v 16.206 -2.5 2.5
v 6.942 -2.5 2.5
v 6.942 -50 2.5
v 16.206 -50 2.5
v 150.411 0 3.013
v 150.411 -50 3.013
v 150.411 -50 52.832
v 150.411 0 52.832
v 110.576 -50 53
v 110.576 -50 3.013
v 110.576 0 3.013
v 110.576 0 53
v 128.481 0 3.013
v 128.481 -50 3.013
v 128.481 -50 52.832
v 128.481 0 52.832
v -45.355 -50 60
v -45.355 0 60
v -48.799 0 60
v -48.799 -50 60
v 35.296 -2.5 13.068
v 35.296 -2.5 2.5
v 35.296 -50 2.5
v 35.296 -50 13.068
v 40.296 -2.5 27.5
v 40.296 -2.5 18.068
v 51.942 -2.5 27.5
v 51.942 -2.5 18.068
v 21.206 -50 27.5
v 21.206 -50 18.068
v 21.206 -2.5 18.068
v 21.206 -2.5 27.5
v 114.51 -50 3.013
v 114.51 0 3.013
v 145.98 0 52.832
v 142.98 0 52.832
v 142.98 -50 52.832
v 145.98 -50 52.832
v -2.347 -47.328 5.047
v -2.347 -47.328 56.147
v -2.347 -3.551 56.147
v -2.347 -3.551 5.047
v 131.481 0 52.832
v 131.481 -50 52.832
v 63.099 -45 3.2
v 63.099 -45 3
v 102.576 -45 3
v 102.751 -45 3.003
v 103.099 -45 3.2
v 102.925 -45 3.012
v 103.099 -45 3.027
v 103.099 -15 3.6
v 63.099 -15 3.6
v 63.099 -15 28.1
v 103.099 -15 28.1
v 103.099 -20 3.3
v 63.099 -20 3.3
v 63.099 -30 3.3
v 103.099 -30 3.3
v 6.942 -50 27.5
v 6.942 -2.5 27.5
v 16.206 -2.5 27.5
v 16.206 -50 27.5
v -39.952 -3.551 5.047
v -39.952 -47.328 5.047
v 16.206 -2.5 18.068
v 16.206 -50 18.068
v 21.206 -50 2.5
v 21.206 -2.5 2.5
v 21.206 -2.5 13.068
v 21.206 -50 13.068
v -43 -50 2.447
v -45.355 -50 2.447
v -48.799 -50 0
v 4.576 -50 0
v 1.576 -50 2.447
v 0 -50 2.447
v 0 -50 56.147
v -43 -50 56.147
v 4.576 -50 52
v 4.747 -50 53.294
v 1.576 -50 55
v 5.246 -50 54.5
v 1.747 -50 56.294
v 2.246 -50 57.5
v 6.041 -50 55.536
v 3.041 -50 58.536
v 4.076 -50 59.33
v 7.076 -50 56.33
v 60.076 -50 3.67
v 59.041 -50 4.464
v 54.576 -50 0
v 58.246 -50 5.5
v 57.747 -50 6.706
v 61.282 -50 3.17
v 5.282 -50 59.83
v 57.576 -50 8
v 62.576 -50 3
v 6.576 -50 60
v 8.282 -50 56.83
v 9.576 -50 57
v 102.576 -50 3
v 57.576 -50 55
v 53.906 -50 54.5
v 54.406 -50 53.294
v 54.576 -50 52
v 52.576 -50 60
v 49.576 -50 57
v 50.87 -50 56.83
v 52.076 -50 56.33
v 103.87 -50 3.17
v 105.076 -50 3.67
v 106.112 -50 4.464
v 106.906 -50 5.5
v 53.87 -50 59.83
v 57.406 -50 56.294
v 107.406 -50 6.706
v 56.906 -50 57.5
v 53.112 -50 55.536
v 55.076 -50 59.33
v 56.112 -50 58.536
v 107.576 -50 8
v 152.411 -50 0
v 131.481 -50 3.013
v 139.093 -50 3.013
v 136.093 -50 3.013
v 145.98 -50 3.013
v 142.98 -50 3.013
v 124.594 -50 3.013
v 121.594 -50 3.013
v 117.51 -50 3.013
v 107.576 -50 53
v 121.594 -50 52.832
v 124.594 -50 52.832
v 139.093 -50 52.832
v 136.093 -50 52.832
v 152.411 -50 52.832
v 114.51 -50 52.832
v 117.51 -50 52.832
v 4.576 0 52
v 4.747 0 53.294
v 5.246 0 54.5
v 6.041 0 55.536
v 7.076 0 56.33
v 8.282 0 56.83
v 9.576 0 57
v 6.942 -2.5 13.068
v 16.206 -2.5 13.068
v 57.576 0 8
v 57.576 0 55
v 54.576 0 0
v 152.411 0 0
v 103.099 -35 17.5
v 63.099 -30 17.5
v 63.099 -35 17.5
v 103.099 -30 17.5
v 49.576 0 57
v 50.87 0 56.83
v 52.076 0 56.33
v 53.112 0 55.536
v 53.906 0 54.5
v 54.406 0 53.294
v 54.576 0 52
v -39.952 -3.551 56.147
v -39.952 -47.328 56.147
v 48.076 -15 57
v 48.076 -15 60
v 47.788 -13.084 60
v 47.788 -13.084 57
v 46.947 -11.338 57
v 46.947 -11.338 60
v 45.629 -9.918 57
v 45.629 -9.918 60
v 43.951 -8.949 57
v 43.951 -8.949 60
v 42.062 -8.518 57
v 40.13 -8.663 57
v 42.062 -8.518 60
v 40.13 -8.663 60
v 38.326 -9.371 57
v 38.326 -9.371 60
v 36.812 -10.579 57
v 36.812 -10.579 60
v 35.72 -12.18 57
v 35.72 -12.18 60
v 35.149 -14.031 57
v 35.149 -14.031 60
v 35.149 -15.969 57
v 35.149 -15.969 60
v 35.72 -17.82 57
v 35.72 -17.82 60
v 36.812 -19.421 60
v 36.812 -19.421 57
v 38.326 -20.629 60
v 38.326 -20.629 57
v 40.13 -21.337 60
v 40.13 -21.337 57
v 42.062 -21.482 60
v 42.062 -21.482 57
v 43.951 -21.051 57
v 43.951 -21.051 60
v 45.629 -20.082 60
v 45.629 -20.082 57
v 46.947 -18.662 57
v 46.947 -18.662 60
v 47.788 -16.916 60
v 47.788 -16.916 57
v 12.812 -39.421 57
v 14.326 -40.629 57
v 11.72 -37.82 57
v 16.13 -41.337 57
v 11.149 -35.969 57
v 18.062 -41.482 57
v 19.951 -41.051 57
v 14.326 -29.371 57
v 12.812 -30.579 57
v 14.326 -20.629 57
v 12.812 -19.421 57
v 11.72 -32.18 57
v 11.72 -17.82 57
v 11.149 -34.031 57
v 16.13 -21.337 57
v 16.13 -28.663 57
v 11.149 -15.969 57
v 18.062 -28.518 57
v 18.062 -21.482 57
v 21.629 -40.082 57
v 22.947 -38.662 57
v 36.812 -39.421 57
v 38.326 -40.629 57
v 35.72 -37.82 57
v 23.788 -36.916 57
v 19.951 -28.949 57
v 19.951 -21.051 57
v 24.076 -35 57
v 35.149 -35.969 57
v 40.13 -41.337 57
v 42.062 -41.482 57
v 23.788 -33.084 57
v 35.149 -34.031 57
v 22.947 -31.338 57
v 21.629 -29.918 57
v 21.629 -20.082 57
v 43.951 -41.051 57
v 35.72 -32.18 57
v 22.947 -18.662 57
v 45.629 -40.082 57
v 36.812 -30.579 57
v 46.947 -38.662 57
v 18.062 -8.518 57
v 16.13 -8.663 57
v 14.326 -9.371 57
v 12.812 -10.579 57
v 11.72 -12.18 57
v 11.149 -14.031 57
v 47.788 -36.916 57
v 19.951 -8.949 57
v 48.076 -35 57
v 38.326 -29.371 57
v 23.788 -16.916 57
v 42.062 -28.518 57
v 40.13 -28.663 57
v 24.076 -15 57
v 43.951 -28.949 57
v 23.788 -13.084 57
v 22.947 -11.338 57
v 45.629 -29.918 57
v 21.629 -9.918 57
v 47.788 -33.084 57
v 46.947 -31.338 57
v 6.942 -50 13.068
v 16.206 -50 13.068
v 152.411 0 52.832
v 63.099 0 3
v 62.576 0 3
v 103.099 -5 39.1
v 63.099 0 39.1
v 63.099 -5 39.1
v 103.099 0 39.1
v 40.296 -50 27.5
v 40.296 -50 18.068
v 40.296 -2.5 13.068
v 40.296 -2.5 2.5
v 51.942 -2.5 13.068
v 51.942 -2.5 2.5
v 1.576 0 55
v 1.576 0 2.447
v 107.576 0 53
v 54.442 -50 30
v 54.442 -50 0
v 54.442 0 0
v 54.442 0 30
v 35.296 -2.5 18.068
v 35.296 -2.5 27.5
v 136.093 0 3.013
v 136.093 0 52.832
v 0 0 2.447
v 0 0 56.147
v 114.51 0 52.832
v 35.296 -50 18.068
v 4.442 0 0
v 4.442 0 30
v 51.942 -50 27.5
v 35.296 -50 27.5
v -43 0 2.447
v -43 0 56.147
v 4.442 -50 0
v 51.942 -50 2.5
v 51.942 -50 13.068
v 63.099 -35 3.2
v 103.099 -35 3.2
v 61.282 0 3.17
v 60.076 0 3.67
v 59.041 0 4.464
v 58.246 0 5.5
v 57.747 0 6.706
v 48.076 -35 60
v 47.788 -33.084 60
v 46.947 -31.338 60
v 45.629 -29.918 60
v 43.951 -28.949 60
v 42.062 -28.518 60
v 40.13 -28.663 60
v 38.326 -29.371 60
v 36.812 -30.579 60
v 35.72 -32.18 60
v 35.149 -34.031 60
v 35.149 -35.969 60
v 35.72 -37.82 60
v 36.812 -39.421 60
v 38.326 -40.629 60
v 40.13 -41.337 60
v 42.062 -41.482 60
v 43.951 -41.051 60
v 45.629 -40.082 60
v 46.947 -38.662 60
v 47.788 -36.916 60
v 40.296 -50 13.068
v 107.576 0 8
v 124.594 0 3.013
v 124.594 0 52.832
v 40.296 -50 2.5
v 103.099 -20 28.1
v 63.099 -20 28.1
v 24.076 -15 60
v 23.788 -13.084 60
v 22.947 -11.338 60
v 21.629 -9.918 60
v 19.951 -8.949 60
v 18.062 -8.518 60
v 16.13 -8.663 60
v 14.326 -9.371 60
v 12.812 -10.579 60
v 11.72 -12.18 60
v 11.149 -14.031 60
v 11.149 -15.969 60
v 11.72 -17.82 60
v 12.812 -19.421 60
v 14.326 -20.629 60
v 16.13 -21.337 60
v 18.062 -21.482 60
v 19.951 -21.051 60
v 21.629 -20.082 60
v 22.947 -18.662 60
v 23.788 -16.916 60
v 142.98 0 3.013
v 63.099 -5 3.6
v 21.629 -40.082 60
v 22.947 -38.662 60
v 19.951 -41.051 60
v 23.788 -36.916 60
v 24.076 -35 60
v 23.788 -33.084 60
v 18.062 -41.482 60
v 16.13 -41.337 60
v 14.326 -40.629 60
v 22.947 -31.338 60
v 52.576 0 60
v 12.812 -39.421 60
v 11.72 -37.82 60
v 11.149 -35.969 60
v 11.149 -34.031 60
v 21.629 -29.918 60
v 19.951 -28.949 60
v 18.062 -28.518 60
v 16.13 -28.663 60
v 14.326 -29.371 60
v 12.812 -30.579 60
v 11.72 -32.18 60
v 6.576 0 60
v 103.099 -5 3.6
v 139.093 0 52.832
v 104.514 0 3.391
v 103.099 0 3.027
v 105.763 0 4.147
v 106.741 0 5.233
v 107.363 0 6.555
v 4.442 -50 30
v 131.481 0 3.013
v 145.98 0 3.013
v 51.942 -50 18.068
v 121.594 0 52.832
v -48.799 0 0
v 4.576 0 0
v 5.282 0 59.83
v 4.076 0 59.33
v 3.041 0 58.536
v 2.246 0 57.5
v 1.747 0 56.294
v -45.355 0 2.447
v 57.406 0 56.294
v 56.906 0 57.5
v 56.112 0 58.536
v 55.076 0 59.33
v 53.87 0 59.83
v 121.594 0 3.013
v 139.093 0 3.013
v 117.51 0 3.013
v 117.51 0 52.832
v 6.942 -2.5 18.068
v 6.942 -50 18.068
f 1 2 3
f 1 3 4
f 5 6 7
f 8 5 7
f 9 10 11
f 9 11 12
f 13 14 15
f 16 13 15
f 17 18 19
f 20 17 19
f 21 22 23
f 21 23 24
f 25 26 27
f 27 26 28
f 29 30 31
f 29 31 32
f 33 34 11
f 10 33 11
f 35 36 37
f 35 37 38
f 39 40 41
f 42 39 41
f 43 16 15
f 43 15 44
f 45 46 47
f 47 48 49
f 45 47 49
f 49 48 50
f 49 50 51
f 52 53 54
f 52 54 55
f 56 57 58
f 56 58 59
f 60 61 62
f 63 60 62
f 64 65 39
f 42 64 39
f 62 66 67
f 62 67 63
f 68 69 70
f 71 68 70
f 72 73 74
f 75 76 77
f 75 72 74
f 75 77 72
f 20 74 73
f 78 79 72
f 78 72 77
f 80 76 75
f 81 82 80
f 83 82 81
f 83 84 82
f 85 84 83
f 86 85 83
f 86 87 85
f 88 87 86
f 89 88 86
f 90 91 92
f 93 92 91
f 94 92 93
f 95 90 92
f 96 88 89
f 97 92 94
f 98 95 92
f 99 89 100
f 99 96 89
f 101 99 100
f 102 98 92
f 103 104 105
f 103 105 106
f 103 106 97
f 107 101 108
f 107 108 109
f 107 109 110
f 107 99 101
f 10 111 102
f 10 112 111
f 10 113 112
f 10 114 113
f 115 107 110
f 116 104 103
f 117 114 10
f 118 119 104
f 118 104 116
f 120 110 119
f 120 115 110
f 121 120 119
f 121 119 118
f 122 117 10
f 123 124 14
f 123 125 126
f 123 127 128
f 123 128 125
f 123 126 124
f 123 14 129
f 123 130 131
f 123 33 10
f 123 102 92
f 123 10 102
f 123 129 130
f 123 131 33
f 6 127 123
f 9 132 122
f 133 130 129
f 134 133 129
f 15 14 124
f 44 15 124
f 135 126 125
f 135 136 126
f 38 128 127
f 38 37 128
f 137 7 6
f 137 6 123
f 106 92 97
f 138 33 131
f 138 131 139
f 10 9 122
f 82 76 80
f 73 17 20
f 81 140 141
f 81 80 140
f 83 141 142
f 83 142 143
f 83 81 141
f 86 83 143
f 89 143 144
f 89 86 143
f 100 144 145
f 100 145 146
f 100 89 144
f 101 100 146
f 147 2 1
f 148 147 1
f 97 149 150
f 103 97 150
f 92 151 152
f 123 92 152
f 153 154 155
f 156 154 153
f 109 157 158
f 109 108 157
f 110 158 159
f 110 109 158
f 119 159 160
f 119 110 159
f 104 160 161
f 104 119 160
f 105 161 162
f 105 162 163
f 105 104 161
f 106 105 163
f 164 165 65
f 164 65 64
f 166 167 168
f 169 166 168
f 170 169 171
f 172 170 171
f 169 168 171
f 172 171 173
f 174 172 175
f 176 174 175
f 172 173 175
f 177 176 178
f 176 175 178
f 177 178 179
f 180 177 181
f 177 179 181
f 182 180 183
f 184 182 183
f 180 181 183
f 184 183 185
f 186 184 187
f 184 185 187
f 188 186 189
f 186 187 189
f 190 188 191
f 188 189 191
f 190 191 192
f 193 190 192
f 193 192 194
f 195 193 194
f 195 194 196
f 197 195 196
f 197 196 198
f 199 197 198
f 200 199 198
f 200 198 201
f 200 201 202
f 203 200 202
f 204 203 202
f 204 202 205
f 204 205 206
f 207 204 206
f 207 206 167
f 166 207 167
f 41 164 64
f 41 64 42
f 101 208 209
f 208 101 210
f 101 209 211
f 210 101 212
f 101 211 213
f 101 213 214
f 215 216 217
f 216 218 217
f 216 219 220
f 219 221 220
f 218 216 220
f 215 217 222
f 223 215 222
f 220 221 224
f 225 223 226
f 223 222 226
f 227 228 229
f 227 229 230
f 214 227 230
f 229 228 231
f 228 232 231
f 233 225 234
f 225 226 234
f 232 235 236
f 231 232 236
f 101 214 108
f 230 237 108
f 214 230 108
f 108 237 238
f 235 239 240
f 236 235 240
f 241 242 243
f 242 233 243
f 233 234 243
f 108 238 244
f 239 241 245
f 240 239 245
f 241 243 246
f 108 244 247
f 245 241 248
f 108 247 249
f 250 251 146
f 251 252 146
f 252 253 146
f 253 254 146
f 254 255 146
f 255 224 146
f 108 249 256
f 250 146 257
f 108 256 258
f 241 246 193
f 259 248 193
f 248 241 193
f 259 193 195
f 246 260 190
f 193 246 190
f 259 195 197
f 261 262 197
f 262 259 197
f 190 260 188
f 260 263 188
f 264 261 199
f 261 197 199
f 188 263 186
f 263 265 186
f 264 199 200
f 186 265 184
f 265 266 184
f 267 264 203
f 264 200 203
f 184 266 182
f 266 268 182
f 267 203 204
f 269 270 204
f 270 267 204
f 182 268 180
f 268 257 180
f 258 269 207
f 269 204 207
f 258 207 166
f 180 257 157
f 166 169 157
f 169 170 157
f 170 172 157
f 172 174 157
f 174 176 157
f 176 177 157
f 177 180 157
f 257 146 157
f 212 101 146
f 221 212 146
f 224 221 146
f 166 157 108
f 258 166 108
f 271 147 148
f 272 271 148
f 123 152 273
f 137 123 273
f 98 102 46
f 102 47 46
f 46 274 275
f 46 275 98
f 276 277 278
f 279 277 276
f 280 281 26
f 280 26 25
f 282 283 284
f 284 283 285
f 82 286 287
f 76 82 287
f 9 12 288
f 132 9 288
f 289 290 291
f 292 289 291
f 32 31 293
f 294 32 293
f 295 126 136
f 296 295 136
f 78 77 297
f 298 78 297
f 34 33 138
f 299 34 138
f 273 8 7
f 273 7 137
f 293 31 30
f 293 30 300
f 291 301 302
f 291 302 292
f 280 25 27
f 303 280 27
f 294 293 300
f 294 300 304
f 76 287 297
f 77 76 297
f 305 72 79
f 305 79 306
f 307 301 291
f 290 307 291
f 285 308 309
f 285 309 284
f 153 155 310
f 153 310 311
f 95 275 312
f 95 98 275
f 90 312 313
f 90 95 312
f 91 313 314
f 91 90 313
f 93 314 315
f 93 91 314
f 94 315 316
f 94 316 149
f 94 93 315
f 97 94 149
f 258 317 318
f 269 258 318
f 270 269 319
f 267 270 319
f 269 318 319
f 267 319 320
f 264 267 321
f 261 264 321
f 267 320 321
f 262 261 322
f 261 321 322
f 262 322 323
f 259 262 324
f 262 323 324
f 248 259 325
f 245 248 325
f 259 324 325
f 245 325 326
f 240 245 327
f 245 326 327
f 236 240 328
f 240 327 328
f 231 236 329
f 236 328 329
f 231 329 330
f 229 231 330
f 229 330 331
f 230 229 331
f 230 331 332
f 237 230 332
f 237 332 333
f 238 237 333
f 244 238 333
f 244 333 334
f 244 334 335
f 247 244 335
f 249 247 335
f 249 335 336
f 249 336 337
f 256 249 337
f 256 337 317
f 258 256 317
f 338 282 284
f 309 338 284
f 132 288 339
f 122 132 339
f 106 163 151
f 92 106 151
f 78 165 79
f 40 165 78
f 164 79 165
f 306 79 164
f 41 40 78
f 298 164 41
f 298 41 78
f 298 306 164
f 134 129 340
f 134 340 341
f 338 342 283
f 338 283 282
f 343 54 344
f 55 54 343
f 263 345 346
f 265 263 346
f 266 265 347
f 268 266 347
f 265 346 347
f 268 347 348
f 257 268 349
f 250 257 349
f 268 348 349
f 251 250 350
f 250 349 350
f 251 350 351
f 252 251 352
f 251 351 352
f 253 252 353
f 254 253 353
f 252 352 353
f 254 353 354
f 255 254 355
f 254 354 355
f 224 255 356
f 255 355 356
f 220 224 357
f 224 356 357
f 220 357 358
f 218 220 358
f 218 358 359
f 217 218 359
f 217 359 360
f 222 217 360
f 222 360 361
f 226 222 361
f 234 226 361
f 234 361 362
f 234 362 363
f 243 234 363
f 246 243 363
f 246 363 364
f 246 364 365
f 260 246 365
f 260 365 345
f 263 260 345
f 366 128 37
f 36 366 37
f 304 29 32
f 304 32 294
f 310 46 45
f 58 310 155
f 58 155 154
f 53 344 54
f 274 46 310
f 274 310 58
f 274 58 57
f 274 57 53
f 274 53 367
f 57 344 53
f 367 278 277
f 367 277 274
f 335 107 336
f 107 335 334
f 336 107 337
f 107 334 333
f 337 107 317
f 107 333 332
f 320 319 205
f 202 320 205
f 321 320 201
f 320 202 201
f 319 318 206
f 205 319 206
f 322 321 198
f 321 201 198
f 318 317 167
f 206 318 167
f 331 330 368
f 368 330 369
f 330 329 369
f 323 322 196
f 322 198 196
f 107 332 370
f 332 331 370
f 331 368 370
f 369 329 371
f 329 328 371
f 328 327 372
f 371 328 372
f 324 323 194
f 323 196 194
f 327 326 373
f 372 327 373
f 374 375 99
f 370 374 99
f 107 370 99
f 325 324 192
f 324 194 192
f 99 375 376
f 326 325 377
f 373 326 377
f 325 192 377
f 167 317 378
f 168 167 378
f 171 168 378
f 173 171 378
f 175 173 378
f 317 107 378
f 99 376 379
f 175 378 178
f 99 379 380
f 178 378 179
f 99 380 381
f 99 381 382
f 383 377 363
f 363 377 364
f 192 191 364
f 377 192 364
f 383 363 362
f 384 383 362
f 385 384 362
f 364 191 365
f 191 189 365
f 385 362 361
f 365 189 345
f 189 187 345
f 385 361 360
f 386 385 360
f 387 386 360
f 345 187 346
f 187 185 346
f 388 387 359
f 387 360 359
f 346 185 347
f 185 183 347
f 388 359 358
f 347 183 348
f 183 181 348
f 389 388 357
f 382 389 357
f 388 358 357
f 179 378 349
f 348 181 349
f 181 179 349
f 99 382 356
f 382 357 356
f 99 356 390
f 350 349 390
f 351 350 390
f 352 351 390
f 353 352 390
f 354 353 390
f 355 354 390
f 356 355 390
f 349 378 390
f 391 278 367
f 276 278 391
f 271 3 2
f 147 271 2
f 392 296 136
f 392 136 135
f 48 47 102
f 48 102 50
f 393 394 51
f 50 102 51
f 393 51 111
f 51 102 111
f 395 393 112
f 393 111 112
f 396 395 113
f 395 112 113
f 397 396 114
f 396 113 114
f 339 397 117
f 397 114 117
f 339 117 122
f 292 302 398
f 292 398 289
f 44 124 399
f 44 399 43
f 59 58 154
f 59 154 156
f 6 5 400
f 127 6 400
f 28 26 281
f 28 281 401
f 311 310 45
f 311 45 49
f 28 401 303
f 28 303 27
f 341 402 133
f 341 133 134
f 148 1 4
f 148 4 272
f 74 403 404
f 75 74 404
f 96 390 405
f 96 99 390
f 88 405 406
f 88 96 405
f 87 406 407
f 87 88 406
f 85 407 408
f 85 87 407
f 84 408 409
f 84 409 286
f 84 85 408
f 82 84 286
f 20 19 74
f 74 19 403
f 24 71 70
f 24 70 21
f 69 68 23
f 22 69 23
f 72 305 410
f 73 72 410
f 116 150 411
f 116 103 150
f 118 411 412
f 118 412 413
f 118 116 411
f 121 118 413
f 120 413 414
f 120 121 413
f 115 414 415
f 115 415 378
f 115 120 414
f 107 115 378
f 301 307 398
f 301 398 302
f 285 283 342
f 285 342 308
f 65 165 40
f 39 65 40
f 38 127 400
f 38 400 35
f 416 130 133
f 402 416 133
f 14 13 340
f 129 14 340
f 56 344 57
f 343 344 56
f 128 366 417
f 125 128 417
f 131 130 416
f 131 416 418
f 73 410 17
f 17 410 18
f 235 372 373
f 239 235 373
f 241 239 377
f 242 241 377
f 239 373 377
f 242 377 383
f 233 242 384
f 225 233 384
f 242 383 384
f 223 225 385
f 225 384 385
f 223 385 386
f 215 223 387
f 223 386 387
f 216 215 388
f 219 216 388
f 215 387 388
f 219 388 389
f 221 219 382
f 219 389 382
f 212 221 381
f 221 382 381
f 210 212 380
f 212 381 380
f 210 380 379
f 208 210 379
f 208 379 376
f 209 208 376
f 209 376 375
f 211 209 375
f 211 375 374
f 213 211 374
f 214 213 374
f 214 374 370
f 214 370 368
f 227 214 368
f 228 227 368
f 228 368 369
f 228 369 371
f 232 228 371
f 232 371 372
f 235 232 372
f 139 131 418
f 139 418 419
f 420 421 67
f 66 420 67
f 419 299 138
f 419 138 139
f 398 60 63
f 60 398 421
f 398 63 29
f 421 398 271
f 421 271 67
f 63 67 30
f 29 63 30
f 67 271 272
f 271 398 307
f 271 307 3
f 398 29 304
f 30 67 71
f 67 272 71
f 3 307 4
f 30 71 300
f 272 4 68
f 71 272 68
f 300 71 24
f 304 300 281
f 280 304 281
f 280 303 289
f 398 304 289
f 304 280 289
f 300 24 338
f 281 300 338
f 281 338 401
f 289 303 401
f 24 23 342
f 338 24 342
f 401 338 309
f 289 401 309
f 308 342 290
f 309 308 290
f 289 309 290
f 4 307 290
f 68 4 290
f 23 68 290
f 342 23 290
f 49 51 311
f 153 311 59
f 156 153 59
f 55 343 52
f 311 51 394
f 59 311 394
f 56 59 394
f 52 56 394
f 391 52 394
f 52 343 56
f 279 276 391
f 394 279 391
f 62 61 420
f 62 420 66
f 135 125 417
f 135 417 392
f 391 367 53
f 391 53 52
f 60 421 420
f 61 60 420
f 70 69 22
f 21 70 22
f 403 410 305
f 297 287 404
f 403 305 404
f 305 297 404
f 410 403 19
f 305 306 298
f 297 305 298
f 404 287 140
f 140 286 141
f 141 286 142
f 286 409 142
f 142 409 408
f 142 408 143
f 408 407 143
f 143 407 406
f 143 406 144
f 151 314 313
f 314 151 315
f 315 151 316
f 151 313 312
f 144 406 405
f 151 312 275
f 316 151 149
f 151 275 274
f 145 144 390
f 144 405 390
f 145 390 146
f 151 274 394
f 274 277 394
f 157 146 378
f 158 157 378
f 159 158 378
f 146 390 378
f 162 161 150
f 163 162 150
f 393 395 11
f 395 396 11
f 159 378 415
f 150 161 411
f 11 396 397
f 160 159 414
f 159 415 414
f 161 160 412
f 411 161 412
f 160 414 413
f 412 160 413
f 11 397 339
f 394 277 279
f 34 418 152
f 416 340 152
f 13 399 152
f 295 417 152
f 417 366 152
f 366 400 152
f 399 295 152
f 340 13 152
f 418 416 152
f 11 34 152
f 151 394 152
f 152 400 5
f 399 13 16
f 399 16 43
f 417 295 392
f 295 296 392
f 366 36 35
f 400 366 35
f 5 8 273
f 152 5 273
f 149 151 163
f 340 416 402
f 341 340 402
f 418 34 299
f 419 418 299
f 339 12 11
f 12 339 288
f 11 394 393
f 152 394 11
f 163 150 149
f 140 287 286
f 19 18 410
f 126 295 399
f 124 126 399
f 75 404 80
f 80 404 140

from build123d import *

# Parameters (mm, degrees)
F0_W      = 2
F0_H      = 49.8195460532
F0_W_2    = 3
F1_DEPTH  = 50
F4_W      = 40
F4_H      = 15
F5_DEPTH  = 36.1
F6_W      = 40
F6_H      = 10
F7_DEPTH  = 35.5
F8_W      = 40
F8_H      = 15
F9_DEPTH  = 25.1
F10_W     = 40
F10_H     = 10
F11_DEPTH = 24.8
F12_W     = 40
F12_H     = 15
F13_DEPTH = 14.5
F14_W     = 40
F14_H     = 10
F15_DEPTH = 14.3
F16_R     = 5
F3_W      = 50
F3_H      = 50
F17_DEPTH = 30
F18_T     = -2.5
F2_R      = 6.5
F19_DEPTH = 13.9
F20_W     = 43
F20_H     = 50
F21_DEPTH = 53.7
F22_W     = 37.6056898385
F22_H     = 43.7766639516
F23_DEPTH = 51.1
F24_W     = 9.2634954209
F24_H     = 5.0000008196
F24_W_2   = 5.0000008196
F24_H_2   = 9.4318167865
F24_W_3   = 14.0909086913
F24_H_3   = 10.5681823939
F24_W_4   = 5.0000026822
F24_W_5   = 11.6455923861
F25_DEPTH = 47.5


with BuildPart() as f1:
    # F0 (on Front) → F1 (new body)
    with BuildSketch(Plane.XZ):
        Polygon((4.5763543636, 0), (4.5763543636, 57), (54.5763543636, 57), (54.5763543636, 0), (107.5763543636, 0), (107.5763543636, 3), (57.5763543636, 3), (57.5763543636, 60), (1.5763543636, 60), (1.5763543636, 2.4467778858), (-45.3553423285, 2.4467778858), (-45.3553423285, 60), (-48.798955977, 60), (-48.798955977, 0), (-45.3553423285, 0), (1.5763543636, 0), align=None)
        Polygon((107.5763543636, 3), (107.5763543636, 0), (110.5763543636, 0), (152.4111737013, 0), (152.4111737013, 3.0127370264), (150.4111737013, 3.0127370264), (145.9802030325, 3.0127370264), (142.9802030325, 3.0127370264), (139.0929906368, 3.0127370264), (136.0929906368, 3.0127370264), (131.4807920456, 3.0127370264), (128.4807920456, 3.0127370264), (124.5935647488, 3.0127370264), (121.5935647488, 3.0127370264), (117.5098730922, 3.0127370264), (114.5098730922, 3.0127370264), (110.5763543636, 3.0127370264), (110.5763543636, 53), (107.5763543636, 53), align=None)
        with Locations((151.4111737013, 27.922510053)):
            Rectangle(F0_W, F0_H)
        with Locations((144.4802030325, 27.922510053)):
            Rectangle(F0_W_2, F0_H)
        with Locations((116.0098730922, 27.922510053)):
            Rectangle(F0_W_2, F0_H)
        with Locations((137.5929906368, 27.922510053)):
            Rectangle(F0_W_2, F0_H)
        with Locations((123.0935647488, 27.922510053)):
            Rectangle(F0_W_2, F0_H)
        with Locations((129.9807920456, 27.922510053)):
            Rectangle(F0_W_2, F0_H)
    extrude(amount=F1_DEPTH)

    # F4 (on face) → F5 (join)
    with BuildSketch(Plane.XY.offset(3)):
        with Locations((83.0988776684, -7.5)):
            Rectangle(F4_W, F4_H)
    extrude(amount=F5_DEPTH)

    # F6 (on face) → F7 (cut)
    with BuildSketch(Plane.XY.offset(39.1)):
        with Locations((83.0988776684, -10)):
            Rectangle(F6_W, F6_H)
    extrude(amount=-F7_DEPTH, mode=Mode.SUBTRACT)

    # F8 (on face) → F9 (join)
    with BuildSketch(Plane.XY.offset(3)):
        with Locations((83.0988776684, -22.5)):
            Rectangle(F8_W, F8_H)
    extrude(amount=F9_DEPTH)

    # F10 (on face) → F11 (cut)
    with BuildSketch(Plane.XY.offset(28.1)):
        with Locations((83.0988776684, -25)):
            Rectangle(F10_W, F10_H)
    extrude(amount=-F11_DEPTH, mode=Mode.SUBTRACT)

    # F12 (on face) → F13 (join)
    with BuildSketch(Plane.XY.offset(3)):
        with Locations((83.0988776684, -37.5)):
            Rectangle(F12_W, F12_H)
    extrude(amount=F13_DEPTH)

    # F14 (on face) → F15 (cut)
    with BuildSketch(Plane.XY.offset(17.5)):
        with Locations((83.0988776684, -40)):
            Rectangle(F14_W, F14_H)
    extrude(amount=-F15_DEPTH, mode=Mode.SUBTRACT)

    # F16
    f16_edges = [f1.edges().sort_by_distance(p)[0] for p in [
        (57.576354, -25, 60),
        (54.576354, -25, 57),
        (4.576354, -25, 57),
        (57.576354, -25, 3),
        (107.576354, -25, 3),
        (1.576354, -25, 60),
    ]]
    fillet(f16_edges, radius=F16_R)

    # F2 (on face) + F10 (on face) → F19 (cut)
    with BuildSketch(Plane.XY.offset(60)):
        with Locations((17.5763543636, -15)):
            Circle(F2_R)
        with Locations((41.5763543636, -15)):
            Circle(F2_R)
        with Locations((17.5763543636, -35)):
            Circle(F2_R)
        with Locations((41.5763543636, -35)):
            Circle(F2_R)
    with BuildSketch(Plane.XY.offset(28.1)):
        with Locations((83.0988776684, -25)):
            Rectangle(F10_W, F10_H)
    extrude(amount=-F19_DEPTH, mode=Mode.SUBTRACT)

    # F20 (on face) → F21 (join)
    with BuildSketch(Plane.XY.offset(2.4467778858)):
        with Locations((-21.5, -25)):
            Rectangle(F20_W, F20_H)
    extrude(amount=F21_DEPTH)

    # F22 (on face) → F23 (cut)
    with BuildSketch(Plane.XY.offset(56.1467778858)):
        with Locations((-21.1496120319, -25.4395254888)):
            Rectangle(F22_W, F22_H)
    extrude(amount=-F23_DEPTH, mode=Mode.SUBTRACT)


with BuildPart() as f17:
    # F3 (on Top) → F17 (new body)
    with BuildSketch(Plane.XY):
        with Locations((29.4420910721, -25)):
            Rectangle(F3_W, F3_H)
    extrude(amount=F17_DEPTH)

    # F18
    f18_openings = [f17.faces().sort_by_distance(p)[0] for p in [
        (29.442091, -50, 15),
    ]]
    offset(amount=F18_T, openings=f18_openings)

    # F24 (on face) → F25 (join)
    with BuildSketch(Plane.XZ.offset(2.5)):
        with Locations((11.5738387826, 15.5681828037)):
            Rectangle(F24_W, F24_H)
        with Locations((18.7055869028, 22.7840916067)):
            Rectangle(F24_W_2, F24_H_2)
        with Locations((18.7055869028, 15.5681828037)):
            Rectangle(F24_W_2, F24_H)
        with Locations((28.2510416582, 15.5681828037)):
            Rectangle(F24_W_3, F24_H)
        with Locations((18.7055869028, 7.784091197)):
            Rectangle(F24_W_2, F24_H_3)
        with Locations((37.796497345, 22.7840916067)):
            Rectangle(F24_W_4, F24_H_2)
        with Locations((37.796497345, 15.5681828037)):
            Rectangle(F24_W_4, F24_H)
        with Locations((46.1192948791, 15.5681828037)):
            Rectangle(F24_W_5, F24_H)
        with Locations((37.796497345, 7.784091197)):
            Rectangle(F24_W_4, F24_H_3)
    extrude(amount=F25_DEPTH)


solid = Compound([f1.part, f17.part])
